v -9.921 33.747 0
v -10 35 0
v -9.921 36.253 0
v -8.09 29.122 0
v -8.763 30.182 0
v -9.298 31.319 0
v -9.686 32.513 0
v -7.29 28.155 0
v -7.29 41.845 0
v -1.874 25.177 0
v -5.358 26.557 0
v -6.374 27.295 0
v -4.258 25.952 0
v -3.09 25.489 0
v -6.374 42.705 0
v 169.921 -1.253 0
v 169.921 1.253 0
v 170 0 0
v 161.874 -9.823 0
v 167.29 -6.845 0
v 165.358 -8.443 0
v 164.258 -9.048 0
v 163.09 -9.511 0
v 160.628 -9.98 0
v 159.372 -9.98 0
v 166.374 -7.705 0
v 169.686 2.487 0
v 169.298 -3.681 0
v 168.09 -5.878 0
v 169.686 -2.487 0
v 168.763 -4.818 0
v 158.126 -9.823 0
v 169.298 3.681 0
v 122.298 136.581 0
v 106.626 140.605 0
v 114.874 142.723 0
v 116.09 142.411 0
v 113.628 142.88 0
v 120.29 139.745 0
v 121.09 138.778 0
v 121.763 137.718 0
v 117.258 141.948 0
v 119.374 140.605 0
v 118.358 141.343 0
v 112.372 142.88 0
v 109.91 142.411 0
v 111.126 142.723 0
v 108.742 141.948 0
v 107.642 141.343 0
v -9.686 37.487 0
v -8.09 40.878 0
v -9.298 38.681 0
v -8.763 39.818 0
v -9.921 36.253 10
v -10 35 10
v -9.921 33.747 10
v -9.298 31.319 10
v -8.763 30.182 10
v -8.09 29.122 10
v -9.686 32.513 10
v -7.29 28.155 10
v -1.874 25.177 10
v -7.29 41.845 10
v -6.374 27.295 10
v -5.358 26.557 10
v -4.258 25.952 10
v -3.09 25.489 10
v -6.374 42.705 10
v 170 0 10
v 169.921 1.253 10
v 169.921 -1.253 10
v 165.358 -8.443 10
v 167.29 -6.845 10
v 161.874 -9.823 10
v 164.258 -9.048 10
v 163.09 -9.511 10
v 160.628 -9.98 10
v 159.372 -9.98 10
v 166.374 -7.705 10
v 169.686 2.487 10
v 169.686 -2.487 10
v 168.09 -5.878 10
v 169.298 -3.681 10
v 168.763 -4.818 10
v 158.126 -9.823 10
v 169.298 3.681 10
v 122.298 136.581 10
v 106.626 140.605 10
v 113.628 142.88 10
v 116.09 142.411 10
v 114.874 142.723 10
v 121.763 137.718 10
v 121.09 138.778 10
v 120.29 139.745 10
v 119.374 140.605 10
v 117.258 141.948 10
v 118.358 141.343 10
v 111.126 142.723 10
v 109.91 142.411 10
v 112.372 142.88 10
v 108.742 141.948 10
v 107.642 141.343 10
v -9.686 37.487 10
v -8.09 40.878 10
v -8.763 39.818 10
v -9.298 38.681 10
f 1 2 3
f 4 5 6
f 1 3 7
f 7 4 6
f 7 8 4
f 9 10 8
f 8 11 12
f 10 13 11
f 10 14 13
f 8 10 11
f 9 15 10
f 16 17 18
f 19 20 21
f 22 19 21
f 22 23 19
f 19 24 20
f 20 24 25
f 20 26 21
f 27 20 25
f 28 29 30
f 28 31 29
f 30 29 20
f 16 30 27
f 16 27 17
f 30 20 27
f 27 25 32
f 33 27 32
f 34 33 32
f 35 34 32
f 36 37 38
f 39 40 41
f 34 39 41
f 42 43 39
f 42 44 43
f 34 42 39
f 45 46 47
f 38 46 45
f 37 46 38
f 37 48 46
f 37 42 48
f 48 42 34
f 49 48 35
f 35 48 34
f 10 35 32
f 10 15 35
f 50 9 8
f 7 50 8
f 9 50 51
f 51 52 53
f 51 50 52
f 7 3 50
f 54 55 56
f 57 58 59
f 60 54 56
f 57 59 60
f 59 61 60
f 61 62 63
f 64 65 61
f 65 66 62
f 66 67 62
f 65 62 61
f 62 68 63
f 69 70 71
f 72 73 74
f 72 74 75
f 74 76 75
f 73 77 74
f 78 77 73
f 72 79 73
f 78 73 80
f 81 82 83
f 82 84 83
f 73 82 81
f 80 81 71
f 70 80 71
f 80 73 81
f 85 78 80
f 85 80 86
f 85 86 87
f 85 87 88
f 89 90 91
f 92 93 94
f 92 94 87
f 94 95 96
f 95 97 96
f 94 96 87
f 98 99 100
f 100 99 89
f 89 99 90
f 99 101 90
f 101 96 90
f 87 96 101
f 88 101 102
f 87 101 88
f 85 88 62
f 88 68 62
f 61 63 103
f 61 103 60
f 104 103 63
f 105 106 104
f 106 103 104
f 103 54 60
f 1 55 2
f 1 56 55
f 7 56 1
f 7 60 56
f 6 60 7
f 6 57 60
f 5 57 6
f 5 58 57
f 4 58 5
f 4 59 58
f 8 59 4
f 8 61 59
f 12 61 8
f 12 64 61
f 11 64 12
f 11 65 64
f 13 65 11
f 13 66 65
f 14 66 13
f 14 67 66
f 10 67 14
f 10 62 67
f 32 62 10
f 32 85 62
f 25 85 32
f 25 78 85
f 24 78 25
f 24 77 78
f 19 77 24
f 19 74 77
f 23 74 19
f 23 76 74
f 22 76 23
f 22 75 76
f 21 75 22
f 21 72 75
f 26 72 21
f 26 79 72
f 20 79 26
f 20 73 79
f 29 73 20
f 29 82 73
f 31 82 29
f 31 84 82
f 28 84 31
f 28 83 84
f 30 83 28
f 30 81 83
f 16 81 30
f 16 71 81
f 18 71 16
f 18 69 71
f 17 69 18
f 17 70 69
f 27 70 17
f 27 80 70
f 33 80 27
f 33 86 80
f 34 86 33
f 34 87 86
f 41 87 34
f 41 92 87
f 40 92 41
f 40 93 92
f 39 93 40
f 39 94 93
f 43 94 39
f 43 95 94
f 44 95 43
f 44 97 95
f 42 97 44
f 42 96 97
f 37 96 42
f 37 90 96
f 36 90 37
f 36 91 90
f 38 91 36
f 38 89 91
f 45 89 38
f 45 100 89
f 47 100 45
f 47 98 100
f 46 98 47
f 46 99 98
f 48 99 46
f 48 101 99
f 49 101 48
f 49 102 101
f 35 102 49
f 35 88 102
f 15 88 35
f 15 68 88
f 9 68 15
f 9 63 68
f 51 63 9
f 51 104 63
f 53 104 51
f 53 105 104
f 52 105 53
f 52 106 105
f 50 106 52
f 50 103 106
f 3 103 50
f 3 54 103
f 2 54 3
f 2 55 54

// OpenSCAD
benq_ht2150st_screwholes = [
    [0, 35],
    [160, 0],
    [160 - 47, 132.9],
];

screwholes = benq_ht2150st_screwholes;

module place_screws() {
    for(point=screwholes)
    translate(point)
    children();
}

module basic_plate_2d() {
    hull()
    place_screws()
    circle(r=10, $fn=50);
}

module basic_plate() {
    linear_extrude(height=10)
    basic_plate_2d();
}

basic_plate();
